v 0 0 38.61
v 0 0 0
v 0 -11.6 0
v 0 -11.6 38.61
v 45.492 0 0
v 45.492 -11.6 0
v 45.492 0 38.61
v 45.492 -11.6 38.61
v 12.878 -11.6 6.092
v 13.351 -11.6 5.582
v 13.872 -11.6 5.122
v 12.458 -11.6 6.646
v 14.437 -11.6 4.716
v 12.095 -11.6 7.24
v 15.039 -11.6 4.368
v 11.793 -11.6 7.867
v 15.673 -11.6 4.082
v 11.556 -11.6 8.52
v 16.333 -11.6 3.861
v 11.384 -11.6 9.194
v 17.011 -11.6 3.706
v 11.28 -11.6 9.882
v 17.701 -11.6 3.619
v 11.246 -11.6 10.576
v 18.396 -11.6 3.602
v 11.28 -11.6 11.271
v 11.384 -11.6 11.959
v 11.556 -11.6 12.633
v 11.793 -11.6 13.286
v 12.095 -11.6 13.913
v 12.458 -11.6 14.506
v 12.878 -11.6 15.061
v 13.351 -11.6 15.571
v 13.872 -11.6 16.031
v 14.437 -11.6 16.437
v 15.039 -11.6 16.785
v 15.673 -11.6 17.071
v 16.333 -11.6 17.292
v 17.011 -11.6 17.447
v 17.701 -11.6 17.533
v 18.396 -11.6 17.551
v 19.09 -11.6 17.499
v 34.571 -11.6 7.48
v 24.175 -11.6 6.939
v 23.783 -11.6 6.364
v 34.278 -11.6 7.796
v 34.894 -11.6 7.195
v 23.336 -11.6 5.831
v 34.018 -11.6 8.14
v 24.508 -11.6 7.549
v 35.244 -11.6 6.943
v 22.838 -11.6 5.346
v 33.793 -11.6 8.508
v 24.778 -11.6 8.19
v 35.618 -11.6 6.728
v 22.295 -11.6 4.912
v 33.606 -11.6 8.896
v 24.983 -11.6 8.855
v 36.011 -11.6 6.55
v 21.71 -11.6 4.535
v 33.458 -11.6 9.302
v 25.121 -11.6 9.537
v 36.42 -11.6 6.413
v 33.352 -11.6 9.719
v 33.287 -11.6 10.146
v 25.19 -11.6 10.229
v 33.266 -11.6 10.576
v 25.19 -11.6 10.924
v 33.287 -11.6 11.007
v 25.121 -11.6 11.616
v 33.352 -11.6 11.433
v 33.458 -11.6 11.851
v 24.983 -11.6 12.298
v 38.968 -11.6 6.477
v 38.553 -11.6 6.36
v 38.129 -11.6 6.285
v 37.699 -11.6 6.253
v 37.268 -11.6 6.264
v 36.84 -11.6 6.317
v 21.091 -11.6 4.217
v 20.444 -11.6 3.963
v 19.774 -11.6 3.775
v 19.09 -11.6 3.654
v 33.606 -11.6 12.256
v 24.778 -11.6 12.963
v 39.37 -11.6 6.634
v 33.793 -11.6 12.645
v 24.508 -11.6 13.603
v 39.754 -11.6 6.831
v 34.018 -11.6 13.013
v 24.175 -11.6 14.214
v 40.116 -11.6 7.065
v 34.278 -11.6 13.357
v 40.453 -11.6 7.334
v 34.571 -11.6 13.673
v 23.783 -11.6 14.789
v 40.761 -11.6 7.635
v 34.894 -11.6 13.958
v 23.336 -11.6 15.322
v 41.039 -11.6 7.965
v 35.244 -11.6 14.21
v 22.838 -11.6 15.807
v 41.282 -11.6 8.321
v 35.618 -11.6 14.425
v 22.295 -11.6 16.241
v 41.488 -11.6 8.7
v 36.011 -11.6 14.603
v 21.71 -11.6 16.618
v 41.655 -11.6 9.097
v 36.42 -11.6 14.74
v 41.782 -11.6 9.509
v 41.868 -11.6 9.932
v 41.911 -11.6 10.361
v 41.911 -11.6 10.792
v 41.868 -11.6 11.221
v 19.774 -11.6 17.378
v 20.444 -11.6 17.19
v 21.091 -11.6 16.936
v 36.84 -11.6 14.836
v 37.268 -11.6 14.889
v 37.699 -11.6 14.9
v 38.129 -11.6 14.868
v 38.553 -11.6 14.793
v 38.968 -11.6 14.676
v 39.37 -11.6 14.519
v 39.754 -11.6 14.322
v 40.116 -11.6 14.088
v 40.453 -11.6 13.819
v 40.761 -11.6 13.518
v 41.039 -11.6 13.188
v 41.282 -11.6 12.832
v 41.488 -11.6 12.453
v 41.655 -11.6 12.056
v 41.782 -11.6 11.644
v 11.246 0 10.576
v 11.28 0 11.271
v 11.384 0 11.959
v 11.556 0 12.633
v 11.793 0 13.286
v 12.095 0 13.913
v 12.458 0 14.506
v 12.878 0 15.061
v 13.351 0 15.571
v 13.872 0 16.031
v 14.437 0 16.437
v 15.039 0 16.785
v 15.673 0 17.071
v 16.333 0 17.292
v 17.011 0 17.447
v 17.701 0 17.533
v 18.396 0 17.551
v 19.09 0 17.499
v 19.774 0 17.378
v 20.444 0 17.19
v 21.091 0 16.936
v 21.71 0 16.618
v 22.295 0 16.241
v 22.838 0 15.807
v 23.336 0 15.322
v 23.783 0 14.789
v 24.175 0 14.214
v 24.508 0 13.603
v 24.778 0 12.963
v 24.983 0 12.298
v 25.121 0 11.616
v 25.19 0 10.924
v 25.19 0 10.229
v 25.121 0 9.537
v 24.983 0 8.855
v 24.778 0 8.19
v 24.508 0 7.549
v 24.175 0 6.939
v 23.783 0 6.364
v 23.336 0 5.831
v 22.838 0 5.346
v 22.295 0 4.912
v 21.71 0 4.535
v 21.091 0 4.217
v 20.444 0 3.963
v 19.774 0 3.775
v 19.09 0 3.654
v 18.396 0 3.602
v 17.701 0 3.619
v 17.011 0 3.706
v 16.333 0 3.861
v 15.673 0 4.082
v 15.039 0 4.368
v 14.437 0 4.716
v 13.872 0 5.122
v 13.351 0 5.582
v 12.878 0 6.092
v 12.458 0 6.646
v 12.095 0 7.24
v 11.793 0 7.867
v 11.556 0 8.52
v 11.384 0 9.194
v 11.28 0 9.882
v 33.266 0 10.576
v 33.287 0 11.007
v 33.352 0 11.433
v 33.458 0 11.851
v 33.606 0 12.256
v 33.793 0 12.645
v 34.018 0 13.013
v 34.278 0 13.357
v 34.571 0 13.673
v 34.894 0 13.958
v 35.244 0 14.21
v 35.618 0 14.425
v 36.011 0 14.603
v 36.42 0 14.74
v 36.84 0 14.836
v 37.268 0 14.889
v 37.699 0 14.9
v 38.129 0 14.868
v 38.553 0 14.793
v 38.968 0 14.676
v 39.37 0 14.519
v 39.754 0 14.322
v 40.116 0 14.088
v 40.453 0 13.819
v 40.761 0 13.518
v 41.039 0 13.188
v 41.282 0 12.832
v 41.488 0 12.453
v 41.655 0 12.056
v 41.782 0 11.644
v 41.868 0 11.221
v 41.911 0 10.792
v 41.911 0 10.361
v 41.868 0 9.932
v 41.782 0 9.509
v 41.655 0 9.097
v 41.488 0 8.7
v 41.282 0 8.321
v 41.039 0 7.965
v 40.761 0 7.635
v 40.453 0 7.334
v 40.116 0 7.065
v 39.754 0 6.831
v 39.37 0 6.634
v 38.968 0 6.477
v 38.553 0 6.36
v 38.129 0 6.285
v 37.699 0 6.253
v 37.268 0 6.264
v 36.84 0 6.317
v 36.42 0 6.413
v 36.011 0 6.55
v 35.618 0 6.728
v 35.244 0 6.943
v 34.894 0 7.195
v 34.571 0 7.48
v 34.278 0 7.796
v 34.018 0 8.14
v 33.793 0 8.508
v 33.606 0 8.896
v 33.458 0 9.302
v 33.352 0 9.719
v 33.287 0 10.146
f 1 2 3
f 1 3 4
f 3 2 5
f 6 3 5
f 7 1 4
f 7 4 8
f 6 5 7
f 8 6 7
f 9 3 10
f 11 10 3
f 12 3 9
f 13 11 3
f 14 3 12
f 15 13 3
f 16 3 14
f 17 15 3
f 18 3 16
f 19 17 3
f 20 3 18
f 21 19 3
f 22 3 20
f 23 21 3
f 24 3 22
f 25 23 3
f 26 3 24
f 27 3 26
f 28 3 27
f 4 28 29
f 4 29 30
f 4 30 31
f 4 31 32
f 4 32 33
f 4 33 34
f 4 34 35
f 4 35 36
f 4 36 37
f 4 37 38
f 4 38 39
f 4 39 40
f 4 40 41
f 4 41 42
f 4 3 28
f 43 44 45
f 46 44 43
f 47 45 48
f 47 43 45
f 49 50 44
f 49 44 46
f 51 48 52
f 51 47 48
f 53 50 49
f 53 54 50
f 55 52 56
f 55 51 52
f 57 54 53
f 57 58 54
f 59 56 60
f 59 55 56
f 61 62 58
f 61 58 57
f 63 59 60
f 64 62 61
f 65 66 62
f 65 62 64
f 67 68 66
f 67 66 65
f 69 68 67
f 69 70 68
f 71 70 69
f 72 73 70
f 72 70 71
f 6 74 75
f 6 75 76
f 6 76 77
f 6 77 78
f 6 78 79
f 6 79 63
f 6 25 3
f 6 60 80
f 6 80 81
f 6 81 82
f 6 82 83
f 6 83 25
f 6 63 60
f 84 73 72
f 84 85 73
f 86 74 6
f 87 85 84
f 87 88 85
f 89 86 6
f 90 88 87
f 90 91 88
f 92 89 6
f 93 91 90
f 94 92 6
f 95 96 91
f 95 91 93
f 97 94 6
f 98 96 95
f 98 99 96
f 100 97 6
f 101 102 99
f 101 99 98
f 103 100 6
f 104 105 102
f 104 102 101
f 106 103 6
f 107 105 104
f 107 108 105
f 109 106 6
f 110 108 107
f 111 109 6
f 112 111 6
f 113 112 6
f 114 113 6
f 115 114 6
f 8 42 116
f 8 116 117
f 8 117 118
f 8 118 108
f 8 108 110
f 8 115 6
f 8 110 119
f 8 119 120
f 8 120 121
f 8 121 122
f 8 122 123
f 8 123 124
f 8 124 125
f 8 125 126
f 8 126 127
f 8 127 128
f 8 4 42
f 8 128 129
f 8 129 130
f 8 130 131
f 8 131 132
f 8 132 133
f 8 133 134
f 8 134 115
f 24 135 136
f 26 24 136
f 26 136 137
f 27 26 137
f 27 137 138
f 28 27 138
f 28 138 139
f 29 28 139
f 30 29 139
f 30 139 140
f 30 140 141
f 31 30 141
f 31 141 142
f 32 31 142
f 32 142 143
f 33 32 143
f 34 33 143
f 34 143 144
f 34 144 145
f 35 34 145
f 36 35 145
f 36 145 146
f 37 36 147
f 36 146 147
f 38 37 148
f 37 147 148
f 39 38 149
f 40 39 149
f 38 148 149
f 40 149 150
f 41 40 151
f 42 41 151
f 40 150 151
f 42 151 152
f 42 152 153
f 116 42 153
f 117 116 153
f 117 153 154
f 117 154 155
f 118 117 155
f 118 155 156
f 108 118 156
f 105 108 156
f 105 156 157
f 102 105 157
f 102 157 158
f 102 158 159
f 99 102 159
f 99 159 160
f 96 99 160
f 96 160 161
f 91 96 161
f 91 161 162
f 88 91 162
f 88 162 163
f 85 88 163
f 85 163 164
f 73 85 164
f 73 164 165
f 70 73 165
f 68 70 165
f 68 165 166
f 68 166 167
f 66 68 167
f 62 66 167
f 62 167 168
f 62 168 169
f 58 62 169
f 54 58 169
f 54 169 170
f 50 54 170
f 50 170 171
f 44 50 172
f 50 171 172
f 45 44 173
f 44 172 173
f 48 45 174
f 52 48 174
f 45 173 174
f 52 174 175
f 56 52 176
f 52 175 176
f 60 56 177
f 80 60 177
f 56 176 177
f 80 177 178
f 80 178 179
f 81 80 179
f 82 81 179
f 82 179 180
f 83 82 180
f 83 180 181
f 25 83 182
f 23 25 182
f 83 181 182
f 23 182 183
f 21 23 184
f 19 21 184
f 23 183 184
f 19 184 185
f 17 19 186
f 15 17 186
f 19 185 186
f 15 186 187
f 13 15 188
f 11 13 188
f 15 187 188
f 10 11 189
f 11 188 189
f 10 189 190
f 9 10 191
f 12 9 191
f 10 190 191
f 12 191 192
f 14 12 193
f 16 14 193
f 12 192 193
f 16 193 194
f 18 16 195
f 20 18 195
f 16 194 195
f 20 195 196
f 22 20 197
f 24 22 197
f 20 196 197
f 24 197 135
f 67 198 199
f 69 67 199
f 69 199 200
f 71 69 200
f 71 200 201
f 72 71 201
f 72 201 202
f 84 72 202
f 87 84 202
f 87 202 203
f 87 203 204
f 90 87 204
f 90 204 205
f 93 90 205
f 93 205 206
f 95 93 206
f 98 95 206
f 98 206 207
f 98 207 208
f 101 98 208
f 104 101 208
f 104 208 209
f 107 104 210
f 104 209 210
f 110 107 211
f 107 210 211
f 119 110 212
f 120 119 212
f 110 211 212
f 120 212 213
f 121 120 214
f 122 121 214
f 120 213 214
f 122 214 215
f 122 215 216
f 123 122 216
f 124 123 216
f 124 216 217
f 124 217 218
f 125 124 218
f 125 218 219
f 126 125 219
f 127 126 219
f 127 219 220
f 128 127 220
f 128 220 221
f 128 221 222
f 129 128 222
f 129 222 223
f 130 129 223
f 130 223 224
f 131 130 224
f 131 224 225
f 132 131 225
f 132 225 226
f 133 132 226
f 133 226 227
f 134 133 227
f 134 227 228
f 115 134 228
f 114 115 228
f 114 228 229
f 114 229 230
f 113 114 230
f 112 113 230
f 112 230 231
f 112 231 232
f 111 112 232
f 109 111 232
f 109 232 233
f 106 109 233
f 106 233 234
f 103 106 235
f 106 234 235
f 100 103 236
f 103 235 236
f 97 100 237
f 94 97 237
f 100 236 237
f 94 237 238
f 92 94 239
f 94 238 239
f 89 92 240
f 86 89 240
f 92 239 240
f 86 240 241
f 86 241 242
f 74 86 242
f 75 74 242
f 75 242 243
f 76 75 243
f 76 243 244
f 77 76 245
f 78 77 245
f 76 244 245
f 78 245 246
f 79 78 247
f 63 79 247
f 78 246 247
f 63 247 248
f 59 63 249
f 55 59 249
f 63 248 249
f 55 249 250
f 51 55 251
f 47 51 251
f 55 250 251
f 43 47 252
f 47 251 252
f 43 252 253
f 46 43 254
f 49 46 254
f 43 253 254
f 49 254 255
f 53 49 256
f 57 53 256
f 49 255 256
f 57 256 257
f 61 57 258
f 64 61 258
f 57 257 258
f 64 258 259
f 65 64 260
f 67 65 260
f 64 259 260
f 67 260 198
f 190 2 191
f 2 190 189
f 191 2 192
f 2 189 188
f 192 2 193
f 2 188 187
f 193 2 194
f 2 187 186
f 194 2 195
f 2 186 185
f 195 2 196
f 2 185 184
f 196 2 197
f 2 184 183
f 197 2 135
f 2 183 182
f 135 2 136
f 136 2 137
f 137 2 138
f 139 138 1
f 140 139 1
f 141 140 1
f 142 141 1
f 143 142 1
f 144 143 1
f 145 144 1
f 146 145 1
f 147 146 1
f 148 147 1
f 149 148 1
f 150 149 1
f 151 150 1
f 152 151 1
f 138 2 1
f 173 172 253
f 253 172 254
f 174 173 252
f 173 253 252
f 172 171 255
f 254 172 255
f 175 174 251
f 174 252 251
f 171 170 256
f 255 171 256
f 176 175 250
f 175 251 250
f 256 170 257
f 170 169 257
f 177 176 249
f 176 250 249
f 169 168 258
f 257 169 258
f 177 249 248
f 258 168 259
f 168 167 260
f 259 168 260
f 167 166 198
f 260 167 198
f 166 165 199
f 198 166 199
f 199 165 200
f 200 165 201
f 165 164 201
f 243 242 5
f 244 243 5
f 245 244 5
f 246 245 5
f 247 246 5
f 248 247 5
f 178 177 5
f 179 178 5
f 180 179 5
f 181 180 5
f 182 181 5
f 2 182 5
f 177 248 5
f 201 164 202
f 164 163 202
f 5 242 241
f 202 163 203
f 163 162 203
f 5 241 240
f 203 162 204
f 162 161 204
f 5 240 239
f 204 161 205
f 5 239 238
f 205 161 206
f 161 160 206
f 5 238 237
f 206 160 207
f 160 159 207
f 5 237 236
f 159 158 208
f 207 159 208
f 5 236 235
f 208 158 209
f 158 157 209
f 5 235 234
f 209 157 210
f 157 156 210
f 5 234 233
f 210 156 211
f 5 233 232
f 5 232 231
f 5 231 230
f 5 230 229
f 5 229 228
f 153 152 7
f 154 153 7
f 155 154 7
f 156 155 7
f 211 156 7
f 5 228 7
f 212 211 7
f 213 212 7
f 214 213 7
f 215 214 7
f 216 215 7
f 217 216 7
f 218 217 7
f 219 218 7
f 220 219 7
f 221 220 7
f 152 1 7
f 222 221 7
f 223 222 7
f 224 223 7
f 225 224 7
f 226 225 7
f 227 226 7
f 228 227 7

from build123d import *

# Parameters (mm, degrees)
F0_W     = 45.491502
F0_H     = 38.61044
F1_DEPTH = 11.6
F2_R     = 6.976475
F2_R_2   = 4.325021
F3_DEPTH = 25


with BuildPart() as f1:
    # F0 (on Front) → F1 (new body)
    with BuildSketch(Plane.XZ):
        with Locations((22.745751, 19.30522)):
            Rectangle(F0_W, F0_H)
    extrude(amount=F1_DEPTH)

    # F2 (on face) → F3 (cut)
    with BuildSketch(Plane(origin=(0, 0, 0), x_dir=(-1, 0, 0), z_dir=(0, 1, 0))):
        with Locations((-18.222088, 10.576457)):
            Circle(F2_R)
        with Locations((-37.591022, 10.576457)):
            Circle(F2_R_2)
    extrude(amount=-F3_DEPTH, mode=Mode.SUBTRACT)


solid = f1.part
